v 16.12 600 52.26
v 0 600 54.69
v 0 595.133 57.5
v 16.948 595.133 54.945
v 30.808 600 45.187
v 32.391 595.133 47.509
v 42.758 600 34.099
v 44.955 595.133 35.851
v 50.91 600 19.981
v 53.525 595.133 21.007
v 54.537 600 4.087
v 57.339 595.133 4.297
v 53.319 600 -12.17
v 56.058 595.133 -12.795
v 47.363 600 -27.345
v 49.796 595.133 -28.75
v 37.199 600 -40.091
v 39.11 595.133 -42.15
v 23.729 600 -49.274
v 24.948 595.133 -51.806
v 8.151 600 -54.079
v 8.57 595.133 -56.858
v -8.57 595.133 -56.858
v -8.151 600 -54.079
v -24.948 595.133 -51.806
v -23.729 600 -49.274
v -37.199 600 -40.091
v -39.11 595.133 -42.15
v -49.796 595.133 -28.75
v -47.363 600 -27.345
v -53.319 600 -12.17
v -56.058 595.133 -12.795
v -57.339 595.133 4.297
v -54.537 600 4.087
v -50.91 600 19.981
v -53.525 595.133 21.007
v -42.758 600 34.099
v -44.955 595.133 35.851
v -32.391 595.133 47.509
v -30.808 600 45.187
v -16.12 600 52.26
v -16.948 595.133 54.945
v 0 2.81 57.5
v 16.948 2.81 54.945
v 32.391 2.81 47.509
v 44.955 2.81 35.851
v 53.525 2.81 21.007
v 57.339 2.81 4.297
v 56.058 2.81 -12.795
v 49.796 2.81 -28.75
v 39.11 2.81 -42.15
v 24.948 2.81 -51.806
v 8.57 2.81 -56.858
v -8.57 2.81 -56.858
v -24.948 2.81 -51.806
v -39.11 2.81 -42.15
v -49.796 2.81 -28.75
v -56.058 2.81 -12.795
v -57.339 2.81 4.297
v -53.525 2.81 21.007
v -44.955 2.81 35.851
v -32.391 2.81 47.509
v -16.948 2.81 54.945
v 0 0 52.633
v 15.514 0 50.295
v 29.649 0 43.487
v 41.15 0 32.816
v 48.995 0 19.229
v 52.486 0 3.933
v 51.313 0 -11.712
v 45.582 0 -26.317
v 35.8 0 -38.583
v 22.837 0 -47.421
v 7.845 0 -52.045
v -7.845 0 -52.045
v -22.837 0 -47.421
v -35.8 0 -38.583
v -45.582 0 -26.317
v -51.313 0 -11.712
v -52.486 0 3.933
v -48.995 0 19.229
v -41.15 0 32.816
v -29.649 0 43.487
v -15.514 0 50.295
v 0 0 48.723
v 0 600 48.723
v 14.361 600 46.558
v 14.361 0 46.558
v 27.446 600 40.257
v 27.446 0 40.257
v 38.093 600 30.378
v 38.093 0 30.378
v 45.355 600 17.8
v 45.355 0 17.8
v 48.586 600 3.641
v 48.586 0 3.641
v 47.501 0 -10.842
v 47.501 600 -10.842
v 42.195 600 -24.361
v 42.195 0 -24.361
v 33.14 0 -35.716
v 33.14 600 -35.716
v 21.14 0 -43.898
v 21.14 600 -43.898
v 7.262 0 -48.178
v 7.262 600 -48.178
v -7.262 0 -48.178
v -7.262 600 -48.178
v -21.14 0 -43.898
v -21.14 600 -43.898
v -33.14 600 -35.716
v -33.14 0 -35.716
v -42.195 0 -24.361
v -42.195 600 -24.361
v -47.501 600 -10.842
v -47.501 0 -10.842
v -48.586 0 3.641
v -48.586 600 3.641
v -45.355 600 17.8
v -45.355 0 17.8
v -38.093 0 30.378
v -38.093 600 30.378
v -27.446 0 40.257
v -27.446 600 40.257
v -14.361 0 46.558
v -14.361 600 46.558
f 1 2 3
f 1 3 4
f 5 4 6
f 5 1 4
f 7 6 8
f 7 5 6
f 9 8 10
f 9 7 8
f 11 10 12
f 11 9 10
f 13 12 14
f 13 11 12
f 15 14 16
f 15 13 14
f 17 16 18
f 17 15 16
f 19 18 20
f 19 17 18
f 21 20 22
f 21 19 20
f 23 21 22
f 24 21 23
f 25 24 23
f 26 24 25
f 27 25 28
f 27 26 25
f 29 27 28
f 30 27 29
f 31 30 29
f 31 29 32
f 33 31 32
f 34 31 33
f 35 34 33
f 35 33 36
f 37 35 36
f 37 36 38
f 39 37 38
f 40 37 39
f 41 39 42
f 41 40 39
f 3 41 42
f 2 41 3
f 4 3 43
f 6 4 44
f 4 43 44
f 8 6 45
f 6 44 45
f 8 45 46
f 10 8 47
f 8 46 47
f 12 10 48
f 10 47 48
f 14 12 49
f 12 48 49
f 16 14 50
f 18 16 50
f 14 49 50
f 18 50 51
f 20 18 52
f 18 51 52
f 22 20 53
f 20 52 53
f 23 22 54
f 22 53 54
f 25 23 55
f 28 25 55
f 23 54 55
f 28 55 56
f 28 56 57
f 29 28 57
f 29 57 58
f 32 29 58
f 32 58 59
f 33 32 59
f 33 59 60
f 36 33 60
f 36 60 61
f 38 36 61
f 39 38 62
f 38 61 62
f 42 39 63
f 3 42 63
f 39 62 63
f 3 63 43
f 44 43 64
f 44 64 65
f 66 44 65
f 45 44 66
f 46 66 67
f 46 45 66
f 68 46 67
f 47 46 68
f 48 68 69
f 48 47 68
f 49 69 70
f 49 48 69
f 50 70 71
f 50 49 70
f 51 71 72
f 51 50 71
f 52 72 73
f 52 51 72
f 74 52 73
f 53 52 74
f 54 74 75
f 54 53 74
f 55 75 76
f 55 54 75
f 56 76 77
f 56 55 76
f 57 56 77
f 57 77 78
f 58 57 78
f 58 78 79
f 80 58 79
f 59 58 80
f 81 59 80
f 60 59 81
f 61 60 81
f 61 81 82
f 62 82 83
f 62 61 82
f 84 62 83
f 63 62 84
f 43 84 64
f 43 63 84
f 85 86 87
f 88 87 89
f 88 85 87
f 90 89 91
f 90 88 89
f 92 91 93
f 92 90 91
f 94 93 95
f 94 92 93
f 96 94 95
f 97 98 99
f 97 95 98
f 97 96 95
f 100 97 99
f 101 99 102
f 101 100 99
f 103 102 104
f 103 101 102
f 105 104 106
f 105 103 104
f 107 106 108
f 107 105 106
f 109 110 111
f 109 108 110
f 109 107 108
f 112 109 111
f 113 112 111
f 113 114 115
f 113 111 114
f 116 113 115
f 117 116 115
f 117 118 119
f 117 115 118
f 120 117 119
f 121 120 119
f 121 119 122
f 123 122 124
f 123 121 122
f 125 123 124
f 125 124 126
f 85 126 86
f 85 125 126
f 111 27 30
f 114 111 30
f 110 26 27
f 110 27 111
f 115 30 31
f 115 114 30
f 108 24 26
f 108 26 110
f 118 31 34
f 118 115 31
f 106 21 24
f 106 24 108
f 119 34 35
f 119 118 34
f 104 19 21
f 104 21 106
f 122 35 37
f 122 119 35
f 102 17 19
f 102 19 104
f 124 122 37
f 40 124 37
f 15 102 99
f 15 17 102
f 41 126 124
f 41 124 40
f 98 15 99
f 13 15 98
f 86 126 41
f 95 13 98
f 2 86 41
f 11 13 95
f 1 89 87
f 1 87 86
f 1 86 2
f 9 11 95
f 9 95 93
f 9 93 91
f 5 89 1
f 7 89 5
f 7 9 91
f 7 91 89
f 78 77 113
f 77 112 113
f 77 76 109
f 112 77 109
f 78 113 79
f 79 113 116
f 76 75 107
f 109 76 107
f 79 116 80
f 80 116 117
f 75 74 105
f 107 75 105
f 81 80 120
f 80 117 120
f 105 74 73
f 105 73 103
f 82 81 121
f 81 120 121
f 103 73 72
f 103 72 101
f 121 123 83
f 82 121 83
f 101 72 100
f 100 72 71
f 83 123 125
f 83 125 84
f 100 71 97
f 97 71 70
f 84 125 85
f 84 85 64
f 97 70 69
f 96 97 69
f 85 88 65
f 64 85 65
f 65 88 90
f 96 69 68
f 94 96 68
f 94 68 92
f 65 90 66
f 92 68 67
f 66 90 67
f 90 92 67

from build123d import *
from OCP.BRepFilletAPI import BRepFilletAPI_MakeChamfer

# Parameters (mm, degrees)
SKETCH1_R           = 57.5
BOSS_EXTRUDE1_DEPTH = 600
SKETCH2_R           = 48.722615626
CUT_EXTRUDE1_DEPTH  = 606.485342515
CHAMFER1_SIZE       = 4.866916263
CHAMFER1_SIZE2      = 2.809915414


with BuildPart() as part:
    # Sketch1 → Boss-Extrude1 (new body)
    with BuildSketch(Plane(origin=(0, 0, 0), x_dir=(1, 0, 0), z_dir=(0, 1, 0))):
        Circle(SKETCH1_R)
    extrude(amount=BOSS_EXTRUDE1_DEPTH)

    # Sketch2 → Cut-Extrude1 (cut, through all)
    with BuildSketch(Plane(origin=(0, 0, 0), x_dir=(1, 0, 0), z_dir=(0, 1, 0))):
        Circle(SKETCH2_R)
    extrude(amount=CUT_EXTRUDE1_DEPTH, mode=Mode.SUBTRACT)

    # Chamfer1: one chamfer whose edges measure the first distance from different faces: ONE call of the kernel's chamfer builder (chamfer() names one face for all edges)
    chamfer1_edges_1 = [part.edges().sort_by_distance(p)[0] for p in [
        (-57.5, 600, 0),
    ]]
    chamfer1_side_1 = [part.faces().sort_by_distance(p)[0] for p in [
        (-57.5, 300, 0),
    ]]
    chamfer1_edges_2 = [part.edges().sort_by_distance(p)[0] for p in [
        (-57.5, 0, 0),
    ]]
    chamfer1_side_2 = [part.faces().sort_by_distance(p)[0] for p in [
        (-55.873654403, 0, 0),
    ]]
    chamfer1 = BRepFilletAPI_MakeChamfer(part.part.solid().wrapped)
    for e in chamfer1_edges_1:
        chamfer1.Add(CHAMFER1_SIZE, CHAMFER1_SIZE2, e.wrapped, chamfer1_side_1[0].wrapped)  # the first distance lies on this face
    for e in chamfer1_edges_2:
        chamfer1.Add(CHAMFER1_SIZE, CHAMFER1_SIZE2, e.wrapped, chamfer1_side_2[0].wrapped)  # the first distance lies on this face
    add(Compound.cast(chamfer1.Shape()), mode=Mode.REPLACE)


solid = part.part
